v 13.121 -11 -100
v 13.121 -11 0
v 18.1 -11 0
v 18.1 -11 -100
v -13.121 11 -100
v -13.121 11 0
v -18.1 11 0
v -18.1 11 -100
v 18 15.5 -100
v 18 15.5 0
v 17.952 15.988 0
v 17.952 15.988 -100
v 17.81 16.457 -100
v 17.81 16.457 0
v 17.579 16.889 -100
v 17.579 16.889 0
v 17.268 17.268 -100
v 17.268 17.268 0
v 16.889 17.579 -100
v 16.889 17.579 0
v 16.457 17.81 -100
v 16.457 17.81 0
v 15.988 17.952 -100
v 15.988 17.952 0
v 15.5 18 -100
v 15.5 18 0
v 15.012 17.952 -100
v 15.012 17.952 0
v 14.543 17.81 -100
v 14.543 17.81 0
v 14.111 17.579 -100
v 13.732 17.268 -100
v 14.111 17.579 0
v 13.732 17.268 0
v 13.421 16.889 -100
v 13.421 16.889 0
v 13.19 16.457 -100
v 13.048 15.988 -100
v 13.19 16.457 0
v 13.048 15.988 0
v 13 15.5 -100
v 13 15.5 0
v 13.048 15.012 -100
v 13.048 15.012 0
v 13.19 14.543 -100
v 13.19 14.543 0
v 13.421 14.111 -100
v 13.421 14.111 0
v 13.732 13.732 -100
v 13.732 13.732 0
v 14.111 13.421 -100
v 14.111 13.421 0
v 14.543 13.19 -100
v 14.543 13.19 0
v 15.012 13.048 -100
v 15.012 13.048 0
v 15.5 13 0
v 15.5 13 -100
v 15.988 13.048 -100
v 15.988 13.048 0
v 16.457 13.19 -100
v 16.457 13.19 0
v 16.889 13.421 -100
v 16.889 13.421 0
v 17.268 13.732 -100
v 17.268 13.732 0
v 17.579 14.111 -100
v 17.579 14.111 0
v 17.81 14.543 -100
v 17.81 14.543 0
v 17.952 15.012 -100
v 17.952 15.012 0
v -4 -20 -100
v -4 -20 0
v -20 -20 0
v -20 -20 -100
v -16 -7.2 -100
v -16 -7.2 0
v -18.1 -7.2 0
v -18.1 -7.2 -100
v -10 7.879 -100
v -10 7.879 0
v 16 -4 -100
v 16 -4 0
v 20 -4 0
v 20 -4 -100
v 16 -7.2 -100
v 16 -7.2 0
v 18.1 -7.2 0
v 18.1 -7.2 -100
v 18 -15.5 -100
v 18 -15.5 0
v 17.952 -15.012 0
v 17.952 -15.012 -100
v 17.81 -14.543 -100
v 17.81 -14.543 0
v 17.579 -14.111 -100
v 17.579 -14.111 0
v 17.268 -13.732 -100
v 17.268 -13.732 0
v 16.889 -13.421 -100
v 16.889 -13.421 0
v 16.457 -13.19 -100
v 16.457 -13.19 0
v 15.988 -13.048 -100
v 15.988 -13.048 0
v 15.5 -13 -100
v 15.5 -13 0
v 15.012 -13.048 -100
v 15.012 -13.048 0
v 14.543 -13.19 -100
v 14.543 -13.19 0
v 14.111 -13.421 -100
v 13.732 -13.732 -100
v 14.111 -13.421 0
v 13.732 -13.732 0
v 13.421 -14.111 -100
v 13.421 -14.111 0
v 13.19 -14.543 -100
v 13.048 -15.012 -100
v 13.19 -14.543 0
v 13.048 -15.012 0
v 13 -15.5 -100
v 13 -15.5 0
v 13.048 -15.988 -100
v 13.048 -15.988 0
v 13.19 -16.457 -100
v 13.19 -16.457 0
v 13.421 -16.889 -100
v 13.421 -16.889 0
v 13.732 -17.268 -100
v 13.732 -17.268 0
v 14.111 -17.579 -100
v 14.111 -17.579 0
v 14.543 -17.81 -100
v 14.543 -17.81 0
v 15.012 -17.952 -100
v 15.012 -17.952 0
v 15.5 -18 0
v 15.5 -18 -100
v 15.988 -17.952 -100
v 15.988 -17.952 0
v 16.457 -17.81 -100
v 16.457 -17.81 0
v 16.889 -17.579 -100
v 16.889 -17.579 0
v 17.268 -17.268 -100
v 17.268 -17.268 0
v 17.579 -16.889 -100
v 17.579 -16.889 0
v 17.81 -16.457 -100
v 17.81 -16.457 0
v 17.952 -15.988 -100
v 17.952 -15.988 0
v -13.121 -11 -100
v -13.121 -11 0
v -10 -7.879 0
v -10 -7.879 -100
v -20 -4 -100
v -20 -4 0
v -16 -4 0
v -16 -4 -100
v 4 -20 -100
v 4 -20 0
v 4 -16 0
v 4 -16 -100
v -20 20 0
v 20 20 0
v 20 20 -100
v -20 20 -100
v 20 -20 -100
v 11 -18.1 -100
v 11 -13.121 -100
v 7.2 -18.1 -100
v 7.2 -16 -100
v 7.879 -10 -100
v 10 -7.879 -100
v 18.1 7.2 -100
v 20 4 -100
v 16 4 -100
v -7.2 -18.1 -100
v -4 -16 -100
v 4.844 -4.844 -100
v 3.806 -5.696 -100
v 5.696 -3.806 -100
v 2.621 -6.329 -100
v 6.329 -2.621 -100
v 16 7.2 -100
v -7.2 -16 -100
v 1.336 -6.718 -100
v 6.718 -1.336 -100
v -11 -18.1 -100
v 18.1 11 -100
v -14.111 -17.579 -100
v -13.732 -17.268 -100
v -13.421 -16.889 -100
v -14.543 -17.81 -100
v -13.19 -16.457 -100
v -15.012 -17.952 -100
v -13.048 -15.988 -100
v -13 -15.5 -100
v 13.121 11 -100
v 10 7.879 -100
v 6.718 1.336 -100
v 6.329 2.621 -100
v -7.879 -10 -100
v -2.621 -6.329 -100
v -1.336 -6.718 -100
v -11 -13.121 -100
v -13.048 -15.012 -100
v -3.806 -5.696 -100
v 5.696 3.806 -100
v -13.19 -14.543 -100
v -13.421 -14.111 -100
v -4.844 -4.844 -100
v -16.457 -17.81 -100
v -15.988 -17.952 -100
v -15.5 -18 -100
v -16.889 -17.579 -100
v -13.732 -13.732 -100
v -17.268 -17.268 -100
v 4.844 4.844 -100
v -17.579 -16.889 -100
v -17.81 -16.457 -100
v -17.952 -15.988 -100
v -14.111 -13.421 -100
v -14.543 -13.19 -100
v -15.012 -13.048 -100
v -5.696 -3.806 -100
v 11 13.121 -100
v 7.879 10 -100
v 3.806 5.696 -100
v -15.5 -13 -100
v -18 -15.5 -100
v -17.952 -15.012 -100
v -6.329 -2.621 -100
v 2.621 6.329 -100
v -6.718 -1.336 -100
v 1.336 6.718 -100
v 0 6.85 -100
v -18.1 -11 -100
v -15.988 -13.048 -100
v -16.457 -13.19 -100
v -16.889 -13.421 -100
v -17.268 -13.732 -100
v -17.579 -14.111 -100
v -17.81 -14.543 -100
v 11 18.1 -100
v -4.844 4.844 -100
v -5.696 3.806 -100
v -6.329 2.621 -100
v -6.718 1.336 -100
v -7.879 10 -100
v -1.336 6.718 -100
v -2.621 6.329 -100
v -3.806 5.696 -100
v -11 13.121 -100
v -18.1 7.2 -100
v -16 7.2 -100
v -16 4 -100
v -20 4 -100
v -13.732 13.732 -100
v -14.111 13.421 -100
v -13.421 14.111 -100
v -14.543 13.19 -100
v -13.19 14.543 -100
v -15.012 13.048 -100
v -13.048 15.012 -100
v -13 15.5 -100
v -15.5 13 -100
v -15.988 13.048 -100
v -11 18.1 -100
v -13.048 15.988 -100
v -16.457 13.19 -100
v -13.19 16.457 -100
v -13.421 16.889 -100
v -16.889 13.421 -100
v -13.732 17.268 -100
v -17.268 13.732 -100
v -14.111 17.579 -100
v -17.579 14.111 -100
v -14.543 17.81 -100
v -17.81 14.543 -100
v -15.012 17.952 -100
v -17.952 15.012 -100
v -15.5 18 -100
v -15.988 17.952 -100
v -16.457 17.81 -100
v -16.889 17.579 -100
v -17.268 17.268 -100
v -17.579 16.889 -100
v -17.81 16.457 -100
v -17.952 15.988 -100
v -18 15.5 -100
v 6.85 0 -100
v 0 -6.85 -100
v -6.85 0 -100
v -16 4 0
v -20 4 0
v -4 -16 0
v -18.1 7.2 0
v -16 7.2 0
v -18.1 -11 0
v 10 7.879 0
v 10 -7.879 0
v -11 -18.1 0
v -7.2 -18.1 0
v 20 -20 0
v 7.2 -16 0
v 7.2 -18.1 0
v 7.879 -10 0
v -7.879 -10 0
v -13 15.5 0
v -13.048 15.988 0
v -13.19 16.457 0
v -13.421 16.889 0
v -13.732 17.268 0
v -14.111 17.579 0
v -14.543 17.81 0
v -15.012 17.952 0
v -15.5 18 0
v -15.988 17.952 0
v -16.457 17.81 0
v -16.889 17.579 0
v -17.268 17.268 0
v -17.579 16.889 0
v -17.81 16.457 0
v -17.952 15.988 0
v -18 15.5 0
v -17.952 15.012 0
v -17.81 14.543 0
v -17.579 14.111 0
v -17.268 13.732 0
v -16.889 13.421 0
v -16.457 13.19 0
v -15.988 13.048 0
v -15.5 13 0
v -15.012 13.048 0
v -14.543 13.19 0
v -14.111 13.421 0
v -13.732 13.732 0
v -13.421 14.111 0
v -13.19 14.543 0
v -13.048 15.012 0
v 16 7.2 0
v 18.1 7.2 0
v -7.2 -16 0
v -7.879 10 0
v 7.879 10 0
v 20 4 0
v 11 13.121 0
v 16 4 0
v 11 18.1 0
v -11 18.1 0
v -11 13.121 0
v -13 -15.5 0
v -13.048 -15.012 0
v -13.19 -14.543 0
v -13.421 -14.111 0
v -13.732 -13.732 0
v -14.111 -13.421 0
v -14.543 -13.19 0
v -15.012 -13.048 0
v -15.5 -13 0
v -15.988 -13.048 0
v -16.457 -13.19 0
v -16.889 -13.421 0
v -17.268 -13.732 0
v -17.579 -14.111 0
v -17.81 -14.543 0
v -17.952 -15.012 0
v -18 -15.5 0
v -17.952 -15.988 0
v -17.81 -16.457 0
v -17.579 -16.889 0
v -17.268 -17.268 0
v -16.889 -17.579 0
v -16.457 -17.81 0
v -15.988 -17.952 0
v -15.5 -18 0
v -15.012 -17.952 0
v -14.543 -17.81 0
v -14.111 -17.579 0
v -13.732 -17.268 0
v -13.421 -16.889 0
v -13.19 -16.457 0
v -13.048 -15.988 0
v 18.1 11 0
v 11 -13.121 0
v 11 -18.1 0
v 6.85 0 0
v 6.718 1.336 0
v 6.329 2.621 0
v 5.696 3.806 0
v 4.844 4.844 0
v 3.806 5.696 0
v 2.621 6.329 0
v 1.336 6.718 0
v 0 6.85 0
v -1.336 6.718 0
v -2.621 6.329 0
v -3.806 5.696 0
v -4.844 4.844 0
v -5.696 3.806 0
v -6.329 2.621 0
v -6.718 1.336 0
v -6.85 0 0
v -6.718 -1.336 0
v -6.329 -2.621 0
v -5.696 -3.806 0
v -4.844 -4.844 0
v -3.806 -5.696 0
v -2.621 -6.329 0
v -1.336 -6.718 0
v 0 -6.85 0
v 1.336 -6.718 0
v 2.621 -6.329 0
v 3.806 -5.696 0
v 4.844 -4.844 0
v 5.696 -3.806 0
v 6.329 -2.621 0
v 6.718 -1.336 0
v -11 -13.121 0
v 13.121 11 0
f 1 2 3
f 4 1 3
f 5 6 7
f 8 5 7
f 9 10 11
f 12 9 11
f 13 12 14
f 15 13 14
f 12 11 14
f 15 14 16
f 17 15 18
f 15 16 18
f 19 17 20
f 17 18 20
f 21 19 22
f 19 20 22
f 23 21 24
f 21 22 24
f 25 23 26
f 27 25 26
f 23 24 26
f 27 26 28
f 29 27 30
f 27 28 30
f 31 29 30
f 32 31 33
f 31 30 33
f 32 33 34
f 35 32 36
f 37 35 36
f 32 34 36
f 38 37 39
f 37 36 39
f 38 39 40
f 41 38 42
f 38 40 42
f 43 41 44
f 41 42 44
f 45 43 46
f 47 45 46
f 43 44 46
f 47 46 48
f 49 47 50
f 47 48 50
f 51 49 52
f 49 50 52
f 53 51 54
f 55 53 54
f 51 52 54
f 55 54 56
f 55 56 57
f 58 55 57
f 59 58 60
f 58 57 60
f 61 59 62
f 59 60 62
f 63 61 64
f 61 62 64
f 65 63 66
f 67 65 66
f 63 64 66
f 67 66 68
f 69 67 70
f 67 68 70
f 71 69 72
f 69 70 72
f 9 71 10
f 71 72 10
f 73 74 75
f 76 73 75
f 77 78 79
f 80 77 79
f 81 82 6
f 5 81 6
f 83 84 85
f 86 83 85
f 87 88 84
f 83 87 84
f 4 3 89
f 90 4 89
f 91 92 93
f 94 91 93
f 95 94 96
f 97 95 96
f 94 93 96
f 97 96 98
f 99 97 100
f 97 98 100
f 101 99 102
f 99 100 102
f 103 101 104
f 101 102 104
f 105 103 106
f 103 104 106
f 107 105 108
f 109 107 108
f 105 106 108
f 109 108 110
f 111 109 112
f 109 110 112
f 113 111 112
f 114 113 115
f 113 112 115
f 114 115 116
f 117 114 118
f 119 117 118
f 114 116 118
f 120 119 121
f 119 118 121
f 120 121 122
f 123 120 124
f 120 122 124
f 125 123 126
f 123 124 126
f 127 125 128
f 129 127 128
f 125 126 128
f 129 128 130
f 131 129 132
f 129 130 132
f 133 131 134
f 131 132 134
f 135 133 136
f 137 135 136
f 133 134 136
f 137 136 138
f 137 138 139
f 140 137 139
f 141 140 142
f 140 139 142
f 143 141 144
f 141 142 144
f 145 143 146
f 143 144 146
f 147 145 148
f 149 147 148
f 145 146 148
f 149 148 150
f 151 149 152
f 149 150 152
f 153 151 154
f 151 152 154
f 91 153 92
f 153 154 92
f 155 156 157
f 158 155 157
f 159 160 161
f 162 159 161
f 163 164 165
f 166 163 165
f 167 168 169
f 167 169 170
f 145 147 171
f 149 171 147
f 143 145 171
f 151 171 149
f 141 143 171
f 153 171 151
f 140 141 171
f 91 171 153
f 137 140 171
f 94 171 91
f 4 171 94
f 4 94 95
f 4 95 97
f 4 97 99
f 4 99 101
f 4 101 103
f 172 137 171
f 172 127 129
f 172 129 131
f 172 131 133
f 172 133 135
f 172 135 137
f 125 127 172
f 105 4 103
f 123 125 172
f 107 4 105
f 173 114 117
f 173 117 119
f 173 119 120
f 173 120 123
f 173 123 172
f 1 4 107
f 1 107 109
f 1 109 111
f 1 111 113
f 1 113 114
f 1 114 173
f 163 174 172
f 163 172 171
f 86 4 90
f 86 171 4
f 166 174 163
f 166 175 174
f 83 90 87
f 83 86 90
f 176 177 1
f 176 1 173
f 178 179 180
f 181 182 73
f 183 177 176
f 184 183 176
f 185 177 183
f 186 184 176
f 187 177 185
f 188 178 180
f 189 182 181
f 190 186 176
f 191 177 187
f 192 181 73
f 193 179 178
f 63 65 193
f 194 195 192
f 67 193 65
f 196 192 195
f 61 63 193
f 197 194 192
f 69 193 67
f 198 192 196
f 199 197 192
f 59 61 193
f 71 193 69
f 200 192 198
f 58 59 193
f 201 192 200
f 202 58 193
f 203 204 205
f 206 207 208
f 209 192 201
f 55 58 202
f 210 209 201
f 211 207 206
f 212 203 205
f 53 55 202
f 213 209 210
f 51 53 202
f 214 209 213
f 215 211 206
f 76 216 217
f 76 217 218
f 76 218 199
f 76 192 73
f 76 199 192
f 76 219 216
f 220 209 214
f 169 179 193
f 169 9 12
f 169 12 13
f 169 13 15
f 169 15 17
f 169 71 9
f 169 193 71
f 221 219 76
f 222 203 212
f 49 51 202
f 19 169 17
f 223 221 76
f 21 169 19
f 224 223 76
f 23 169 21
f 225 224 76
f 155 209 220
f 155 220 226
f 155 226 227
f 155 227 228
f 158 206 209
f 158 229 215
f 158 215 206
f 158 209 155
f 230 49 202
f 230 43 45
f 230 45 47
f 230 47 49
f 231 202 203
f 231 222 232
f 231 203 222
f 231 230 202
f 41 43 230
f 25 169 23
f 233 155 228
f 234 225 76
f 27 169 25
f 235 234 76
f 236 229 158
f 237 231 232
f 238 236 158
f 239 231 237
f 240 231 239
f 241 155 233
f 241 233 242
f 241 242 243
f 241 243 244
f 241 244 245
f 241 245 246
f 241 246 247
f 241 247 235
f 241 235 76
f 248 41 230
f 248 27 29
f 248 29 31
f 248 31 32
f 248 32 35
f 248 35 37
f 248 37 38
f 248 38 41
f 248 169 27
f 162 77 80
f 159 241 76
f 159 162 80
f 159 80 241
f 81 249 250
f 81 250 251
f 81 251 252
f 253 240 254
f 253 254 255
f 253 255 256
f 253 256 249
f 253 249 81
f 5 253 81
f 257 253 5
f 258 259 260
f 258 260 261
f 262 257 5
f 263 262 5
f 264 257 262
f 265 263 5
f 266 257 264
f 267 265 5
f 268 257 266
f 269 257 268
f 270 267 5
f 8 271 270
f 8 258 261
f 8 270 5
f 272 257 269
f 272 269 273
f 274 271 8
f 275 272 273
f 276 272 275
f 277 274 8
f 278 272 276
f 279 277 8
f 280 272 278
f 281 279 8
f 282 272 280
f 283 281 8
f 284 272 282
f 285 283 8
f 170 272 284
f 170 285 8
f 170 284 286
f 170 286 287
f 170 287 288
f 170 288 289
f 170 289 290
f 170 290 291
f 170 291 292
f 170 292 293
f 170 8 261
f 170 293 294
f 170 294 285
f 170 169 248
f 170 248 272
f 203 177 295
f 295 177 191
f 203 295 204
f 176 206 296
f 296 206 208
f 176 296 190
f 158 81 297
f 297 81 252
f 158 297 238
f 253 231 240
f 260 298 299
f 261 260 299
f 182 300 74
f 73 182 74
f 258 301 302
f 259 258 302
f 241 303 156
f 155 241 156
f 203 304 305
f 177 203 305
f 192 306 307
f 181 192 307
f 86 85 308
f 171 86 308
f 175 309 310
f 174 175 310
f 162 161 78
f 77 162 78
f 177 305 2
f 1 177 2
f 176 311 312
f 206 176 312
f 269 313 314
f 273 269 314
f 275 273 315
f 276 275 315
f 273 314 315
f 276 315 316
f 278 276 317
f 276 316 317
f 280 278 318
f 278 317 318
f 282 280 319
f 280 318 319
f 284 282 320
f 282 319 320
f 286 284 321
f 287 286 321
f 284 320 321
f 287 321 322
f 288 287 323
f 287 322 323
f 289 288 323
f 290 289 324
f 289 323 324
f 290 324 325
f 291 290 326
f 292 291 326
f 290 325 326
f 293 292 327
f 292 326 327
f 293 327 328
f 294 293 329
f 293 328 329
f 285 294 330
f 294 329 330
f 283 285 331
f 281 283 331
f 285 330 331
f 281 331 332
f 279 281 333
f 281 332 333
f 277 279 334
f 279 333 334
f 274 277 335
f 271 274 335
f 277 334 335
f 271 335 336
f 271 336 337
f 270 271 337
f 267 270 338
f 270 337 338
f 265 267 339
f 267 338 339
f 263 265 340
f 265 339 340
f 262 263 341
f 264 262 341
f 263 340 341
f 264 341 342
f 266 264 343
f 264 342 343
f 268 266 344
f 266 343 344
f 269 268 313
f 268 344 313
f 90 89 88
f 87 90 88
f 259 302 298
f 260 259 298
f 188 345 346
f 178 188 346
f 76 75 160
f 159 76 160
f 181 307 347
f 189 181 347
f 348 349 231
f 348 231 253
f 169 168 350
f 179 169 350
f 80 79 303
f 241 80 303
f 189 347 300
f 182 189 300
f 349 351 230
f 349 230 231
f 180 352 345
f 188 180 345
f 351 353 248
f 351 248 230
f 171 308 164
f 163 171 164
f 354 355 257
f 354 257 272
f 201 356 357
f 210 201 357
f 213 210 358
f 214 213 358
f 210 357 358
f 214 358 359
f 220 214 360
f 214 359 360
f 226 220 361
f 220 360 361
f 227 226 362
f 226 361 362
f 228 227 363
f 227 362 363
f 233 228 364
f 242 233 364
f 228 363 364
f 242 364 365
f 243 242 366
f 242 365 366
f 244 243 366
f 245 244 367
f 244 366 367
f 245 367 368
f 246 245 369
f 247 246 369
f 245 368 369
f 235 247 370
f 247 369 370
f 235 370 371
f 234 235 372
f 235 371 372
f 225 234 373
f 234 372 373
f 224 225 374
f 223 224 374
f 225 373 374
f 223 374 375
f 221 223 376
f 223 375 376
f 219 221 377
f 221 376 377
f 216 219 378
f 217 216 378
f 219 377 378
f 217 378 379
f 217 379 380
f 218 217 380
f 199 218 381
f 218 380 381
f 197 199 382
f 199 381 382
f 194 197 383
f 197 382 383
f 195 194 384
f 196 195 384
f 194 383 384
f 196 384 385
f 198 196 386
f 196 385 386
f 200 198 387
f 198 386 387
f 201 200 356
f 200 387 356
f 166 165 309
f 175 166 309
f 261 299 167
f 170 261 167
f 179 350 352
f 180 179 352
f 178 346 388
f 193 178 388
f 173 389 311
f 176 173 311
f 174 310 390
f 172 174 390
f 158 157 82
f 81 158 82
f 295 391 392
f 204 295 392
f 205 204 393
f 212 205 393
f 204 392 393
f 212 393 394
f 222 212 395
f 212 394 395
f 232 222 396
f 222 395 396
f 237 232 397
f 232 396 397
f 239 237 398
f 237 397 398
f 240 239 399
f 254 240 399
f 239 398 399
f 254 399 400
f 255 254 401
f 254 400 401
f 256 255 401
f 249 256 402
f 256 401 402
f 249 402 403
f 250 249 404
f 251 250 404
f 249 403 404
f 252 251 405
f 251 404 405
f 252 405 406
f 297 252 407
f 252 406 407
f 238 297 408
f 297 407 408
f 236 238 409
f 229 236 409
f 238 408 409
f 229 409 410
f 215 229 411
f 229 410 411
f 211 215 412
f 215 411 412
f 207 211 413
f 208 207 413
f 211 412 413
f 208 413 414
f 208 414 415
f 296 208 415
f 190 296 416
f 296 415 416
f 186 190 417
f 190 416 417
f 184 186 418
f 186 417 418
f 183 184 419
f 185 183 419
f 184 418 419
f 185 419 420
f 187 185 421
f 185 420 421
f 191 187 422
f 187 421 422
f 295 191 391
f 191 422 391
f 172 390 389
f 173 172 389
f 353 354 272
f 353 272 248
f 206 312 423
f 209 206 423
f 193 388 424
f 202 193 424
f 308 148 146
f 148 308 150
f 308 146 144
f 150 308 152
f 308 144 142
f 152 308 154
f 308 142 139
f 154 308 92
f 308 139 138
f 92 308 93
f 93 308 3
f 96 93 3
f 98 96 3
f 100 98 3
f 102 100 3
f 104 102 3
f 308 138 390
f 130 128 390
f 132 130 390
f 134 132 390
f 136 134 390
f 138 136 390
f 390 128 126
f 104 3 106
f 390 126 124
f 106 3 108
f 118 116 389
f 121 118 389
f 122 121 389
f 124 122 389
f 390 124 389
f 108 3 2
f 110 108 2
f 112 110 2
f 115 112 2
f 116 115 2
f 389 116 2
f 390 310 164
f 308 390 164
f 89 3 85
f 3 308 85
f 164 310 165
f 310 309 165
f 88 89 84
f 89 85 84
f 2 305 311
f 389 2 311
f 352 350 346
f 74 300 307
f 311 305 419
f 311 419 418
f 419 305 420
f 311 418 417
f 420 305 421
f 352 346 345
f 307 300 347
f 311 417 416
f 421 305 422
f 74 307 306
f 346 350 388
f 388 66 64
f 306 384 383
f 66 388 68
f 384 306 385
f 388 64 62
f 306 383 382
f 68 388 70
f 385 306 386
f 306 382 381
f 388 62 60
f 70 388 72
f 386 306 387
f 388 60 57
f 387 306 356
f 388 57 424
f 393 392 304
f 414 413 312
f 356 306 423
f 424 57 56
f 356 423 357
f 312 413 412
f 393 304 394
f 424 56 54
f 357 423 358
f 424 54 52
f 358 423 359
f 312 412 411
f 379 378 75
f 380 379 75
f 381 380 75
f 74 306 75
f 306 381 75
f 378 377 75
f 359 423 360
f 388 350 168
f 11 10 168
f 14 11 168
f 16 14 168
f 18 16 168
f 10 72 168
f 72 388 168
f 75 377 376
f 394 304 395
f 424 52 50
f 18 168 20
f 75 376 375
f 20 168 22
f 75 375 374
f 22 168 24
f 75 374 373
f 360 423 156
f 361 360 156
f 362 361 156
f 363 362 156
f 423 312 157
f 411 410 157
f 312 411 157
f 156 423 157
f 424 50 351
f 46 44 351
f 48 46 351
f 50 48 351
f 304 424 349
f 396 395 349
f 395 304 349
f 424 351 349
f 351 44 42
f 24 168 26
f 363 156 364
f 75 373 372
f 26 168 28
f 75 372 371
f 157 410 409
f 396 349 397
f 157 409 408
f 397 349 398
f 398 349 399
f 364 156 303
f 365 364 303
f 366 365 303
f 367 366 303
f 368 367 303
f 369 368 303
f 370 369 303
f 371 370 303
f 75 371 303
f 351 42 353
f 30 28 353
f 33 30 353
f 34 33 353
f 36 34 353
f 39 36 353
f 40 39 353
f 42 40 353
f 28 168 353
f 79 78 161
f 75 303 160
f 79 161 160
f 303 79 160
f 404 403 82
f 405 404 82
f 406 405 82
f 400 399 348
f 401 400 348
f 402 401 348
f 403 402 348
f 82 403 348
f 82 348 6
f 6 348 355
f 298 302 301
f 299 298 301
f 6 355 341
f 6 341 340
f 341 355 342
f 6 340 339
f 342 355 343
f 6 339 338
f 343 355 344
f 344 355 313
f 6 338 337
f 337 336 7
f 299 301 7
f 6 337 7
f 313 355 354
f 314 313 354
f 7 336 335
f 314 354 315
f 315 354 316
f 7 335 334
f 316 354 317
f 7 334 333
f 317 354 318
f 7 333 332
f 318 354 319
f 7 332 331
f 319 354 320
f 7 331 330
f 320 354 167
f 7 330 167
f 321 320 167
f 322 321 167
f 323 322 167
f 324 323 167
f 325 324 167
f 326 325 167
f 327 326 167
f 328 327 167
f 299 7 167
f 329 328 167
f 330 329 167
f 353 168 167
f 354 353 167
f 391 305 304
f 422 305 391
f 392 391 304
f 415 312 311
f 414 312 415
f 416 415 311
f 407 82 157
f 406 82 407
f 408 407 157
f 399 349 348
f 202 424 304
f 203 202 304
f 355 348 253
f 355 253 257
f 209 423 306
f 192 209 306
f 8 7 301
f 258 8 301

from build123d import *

# Parameters (mm, degrees)
SKETCH_C02_1_R   = 2.5
SKETCH_C02_1_R_2 = 6.85
EXTRUDE1_DEPTH   = 100


with BuildPart() as part:
    # Sketch C02-1 → Extrude1 (new body)
    with BuildSketch(Plane.XY):
        Polygon((-4, 20), (4, 20), (20, 20), (20, 4), (16, 4), (16, 7.2), (18.1, 7.2), (18.1, 11), (13.12132, 11), (10, 7.87868), (10, -7.87868), (13.12132, -11), (18.1, -11), (18.1, -7.2), (16, -7.2), (16, -4), (20, -4), (20, -20), (4, -20), (4, -16), (7.2, -16), (7.2, -18.1), (11, -18.1), (11, -13.12132), (7.87868, -10), (-7.87868, -10), (-11, -13.12132), (-11, -18.1), (-7.2, -18.1), (-7.2, -16), (-4, -16), (-4, -20), (-20, -20), (-20, -4), (-16, -4), (-16, -7.2), (-18.1, -7.2), (-18.1, -11), (-13.12132, -11), (-10, -7.87868), (-10, 7.87868), (-13.12132, 11), (-18.1, 11), (-18.1, 7.2), (-16, 7.2), (-16, 4), (-20, 4), (-20, 20), align=None)
        with Locations((-15.5, -15.5)):
            Circle(SKETCH_C02_1_R, mode=Mode.SUBTRACT)
        with Locations((-15.5, 15.5)):
            Circle(SKETCH_C02_1_R, mode=Mode.SUBTRACT)
        with Locations((15.5, -15.5)):
            Circle(SKETCH_C02_1_R, mode=Mode.SUBTRACT)
        with Locations((15.5, 15.5)):
            Circle(SKETCH_C02_1_R, mode=Mode.SUBTRACT)
        Circle(SKETCH_C02_1_R_2, mode=Mode.SUBTRACT)
        Polygon((-4, 18.1), (4, 18.1), (11, 18.1), (11, 13.12132), (7.87868, 10), (-7.87868, 10), (-11, 13.12132), (-11, 18.1), align=None, mode=Mode.SUBTRACT)
    extrude(amount=-EXTRUDE1_DEPTH)


solid = part.part
